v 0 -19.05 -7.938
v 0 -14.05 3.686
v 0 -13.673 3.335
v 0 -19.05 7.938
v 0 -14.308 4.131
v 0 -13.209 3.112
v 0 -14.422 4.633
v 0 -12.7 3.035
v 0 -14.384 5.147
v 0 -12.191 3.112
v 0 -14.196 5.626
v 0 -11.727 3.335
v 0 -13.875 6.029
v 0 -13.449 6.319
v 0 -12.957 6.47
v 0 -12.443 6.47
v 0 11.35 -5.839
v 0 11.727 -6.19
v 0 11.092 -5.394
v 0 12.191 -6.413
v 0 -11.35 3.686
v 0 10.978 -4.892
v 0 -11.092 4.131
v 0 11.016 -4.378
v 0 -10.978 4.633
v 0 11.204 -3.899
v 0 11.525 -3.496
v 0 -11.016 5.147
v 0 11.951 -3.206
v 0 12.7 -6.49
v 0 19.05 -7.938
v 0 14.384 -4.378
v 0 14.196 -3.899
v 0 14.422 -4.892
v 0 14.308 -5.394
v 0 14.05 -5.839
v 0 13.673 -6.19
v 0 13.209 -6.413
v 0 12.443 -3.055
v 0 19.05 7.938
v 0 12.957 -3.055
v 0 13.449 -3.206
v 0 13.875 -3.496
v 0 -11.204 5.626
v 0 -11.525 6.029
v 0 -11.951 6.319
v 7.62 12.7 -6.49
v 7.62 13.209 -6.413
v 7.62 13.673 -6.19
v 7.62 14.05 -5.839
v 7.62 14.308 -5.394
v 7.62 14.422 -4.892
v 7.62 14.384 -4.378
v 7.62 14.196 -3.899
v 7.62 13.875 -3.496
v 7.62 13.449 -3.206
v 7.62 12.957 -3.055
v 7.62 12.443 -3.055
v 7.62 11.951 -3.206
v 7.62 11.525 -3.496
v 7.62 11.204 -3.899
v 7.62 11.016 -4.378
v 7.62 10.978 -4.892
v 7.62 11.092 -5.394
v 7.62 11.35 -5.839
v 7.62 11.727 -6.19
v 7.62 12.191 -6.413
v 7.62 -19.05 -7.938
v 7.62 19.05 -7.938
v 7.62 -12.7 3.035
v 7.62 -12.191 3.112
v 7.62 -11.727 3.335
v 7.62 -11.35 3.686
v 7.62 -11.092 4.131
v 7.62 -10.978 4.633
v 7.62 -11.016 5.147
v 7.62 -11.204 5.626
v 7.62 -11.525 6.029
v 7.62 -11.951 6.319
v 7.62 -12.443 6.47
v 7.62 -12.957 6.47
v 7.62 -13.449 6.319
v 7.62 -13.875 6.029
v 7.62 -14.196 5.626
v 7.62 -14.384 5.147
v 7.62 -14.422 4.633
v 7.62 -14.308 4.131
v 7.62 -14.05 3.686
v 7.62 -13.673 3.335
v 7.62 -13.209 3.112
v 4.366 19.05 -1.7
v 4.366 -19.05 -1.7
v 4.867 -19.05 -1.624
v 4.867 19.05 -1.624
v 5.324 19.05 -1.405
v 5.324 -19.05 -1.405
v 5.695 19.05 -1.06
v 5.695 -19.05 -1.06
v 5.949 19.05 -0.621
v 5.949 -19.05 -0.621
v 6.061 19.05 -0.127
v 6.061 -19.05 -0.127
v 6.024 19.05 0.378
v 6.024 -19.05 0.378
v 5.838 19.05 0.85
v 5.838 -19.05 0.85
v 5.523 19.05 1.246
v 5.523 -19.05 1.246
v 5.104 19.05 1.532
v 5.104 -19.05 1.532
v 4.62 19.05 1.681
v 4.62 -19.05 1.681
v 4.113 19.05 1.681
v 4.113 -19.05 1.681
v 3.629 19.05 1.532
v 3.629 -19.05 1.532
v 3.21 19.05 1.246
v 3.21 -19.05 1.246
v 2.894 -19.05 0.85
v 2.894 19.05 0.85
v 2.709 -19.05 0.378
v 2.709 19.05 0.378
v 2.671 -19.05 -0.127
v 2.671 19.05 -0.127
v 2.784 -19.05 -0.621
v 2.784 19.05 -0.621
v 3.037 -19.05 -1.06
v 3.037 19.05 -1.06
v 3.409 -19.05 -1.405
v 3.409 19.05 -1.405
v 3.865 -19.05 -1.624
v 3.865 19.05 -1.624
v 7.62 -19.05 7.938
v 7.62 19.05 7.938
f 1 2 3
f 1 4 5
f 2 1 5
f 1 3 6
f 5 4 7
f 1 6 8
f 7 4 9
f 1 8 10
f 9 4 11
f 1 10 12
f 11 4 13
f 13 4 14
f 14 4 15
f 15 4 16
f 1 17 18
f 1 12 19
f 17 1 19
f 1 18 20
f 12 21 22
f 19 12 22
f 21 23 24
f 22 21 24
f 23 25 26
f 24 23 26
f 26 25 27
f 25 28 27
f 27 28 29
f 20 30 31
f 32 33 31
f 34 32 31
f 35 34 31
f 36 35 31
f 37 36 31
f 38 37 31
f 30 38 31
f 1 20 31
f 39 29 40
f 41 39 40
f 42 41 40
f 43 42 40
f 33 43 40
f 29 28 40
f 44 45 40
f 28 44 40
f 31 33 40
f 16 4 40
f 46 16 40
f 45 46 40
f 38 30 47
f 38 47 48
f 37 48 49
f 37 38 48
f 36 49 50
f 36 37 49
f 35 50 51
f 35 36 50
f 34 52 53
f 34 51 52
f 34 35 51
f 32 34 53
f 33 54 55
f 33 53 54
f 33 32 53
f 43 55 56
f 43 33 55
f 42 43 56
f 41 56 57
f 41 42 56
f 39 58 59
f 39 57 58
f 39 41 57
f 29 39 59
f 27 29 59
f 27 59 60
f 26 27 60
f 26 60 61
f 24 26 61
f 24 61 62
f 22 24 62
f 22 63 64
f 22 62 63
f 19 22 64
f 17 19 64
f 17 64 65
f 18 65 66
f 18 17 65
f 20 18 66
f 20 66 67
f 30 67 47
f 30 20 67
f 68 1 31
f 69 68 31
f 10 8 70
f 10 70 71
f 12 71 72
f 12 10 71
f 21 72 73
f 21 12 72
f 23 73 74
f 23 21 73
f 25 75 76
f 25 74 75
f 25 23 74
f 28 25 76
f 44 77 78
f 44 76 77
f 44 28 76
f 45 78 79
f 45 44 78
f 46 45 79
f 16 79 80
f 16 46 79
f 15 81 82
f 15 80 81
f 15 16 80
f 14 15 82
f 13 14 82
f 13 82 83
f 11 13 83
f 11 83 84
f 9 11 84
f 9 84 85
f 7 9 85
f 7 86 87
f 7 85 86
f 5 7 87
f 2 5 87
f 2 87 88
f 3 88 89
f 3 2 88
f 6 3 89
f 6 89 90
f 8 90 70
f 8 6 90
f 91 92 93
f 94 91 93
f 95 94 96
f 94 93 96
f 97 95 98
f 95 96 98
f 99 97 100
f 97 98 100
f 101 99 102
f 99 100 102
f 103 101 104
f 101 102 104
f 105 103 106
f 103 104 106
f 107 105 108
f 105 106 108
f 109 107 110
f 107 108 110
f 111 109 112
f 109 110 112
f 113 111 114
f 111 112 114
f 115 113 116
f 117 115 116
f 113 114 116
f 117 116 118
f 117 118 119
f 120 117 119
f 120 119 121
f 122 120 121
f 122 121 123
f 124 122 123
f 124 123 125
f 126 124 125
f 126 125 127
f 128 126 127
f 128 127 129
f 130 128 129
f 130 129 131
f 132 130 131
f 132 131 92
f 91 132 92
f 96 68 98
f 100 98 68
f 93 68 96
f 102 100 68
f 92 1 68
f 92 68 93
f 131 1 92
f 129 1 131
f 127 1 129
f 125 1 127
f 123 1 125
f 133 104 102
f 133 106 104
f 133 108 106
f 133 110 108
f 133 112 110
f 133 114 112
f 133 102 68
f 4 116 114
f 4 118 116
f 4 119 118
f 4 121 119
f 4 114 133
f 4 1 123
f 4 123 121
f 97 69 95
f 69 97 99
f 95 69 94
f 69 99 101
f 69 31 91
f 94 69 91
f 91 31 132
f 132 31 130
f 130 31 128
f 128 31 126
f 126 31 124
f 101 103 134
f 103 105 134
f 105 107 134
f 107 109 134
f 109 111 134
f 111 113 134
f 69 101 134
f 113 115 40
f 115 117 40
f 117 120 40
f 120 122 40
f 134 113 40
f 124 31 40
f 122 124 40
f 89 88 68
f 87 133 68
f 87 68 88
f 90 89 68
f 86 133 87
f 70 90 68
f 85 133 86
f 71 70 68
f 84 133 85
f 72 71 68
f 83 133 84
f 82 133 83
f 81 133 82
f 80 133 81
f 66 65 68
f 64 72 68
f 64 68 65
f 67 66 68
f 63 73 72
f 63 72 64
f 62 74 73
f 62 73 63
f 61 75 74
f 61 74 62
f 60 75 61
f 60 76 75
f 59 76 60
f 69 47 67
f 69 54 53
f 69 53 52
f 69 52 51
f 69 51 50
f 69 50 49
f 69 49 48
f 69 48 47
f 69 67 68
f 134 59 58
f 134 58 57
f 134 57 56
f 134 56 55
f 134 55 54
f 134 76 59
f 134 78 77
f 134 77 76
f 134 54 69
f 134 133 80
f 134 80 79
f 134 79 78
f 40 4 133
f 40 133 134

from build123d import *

# Parameters (mm, degrees)
SKETCH1_W               = 38.1
SKETCH1_H               = 15.875
BOSS_EXTRUDE1_DEPTH     = 7.62
SKETCH3_R               = 1.7
CUT_EXTRUDE1_DEPTH      = 49.4665
CUT_EXTRUDE2_DEPTH      = 3.302
CUT_EXTRUDE2_DEPTH_BACK = 22.2885
SKETCH4_R               = 1.7272


with BuildPart() as part:
    # Sketch1 → Boss-Extrude1 (new body)
    with BuildSketch(Plane.YZ):
        Rectangle(SKETCH1_W, SKETCH1_H)
    extrude(amount=BOSS_EXTRUDE1_DEPTH)

    # Sketch3 → Cut-Extrude1 (cut)
    with BuildSketch(Plane.XZ.offset(19.05)):
        with Locations(Location((4.36625, 0, 0), (0, 0, 270))):
            Circle(SKETCH3_R)
    extrude(amount=-CUT_EXTRUDE1_DEPTH, mode=Mode.SUBTRACT)

    # Sketch4 → Cut-Extrude2 (cut, two sides: drawn at the far end of the back side and taken through both)
    with BuildSketch(Plane.YZ.offset(7.62).offset(-CUT_EXTRUDE2_DEPTH_BACK)):
        with Locations(Location((-12.7, 4.7625, 0), (0, 0, 270))):
            Circle(SKETCH4_R)
        with Locations(Location((12.7, -4.7625, 0), (0, 0, 270))):
            Circle(SKETCH4_R)
    extrude(amount=CUT_EXTRUDE2_DEPTH + CUT_EXTRUDE2_DEPTH_BACK, mode=Mode.SUBTRACT)


solid = part.part
